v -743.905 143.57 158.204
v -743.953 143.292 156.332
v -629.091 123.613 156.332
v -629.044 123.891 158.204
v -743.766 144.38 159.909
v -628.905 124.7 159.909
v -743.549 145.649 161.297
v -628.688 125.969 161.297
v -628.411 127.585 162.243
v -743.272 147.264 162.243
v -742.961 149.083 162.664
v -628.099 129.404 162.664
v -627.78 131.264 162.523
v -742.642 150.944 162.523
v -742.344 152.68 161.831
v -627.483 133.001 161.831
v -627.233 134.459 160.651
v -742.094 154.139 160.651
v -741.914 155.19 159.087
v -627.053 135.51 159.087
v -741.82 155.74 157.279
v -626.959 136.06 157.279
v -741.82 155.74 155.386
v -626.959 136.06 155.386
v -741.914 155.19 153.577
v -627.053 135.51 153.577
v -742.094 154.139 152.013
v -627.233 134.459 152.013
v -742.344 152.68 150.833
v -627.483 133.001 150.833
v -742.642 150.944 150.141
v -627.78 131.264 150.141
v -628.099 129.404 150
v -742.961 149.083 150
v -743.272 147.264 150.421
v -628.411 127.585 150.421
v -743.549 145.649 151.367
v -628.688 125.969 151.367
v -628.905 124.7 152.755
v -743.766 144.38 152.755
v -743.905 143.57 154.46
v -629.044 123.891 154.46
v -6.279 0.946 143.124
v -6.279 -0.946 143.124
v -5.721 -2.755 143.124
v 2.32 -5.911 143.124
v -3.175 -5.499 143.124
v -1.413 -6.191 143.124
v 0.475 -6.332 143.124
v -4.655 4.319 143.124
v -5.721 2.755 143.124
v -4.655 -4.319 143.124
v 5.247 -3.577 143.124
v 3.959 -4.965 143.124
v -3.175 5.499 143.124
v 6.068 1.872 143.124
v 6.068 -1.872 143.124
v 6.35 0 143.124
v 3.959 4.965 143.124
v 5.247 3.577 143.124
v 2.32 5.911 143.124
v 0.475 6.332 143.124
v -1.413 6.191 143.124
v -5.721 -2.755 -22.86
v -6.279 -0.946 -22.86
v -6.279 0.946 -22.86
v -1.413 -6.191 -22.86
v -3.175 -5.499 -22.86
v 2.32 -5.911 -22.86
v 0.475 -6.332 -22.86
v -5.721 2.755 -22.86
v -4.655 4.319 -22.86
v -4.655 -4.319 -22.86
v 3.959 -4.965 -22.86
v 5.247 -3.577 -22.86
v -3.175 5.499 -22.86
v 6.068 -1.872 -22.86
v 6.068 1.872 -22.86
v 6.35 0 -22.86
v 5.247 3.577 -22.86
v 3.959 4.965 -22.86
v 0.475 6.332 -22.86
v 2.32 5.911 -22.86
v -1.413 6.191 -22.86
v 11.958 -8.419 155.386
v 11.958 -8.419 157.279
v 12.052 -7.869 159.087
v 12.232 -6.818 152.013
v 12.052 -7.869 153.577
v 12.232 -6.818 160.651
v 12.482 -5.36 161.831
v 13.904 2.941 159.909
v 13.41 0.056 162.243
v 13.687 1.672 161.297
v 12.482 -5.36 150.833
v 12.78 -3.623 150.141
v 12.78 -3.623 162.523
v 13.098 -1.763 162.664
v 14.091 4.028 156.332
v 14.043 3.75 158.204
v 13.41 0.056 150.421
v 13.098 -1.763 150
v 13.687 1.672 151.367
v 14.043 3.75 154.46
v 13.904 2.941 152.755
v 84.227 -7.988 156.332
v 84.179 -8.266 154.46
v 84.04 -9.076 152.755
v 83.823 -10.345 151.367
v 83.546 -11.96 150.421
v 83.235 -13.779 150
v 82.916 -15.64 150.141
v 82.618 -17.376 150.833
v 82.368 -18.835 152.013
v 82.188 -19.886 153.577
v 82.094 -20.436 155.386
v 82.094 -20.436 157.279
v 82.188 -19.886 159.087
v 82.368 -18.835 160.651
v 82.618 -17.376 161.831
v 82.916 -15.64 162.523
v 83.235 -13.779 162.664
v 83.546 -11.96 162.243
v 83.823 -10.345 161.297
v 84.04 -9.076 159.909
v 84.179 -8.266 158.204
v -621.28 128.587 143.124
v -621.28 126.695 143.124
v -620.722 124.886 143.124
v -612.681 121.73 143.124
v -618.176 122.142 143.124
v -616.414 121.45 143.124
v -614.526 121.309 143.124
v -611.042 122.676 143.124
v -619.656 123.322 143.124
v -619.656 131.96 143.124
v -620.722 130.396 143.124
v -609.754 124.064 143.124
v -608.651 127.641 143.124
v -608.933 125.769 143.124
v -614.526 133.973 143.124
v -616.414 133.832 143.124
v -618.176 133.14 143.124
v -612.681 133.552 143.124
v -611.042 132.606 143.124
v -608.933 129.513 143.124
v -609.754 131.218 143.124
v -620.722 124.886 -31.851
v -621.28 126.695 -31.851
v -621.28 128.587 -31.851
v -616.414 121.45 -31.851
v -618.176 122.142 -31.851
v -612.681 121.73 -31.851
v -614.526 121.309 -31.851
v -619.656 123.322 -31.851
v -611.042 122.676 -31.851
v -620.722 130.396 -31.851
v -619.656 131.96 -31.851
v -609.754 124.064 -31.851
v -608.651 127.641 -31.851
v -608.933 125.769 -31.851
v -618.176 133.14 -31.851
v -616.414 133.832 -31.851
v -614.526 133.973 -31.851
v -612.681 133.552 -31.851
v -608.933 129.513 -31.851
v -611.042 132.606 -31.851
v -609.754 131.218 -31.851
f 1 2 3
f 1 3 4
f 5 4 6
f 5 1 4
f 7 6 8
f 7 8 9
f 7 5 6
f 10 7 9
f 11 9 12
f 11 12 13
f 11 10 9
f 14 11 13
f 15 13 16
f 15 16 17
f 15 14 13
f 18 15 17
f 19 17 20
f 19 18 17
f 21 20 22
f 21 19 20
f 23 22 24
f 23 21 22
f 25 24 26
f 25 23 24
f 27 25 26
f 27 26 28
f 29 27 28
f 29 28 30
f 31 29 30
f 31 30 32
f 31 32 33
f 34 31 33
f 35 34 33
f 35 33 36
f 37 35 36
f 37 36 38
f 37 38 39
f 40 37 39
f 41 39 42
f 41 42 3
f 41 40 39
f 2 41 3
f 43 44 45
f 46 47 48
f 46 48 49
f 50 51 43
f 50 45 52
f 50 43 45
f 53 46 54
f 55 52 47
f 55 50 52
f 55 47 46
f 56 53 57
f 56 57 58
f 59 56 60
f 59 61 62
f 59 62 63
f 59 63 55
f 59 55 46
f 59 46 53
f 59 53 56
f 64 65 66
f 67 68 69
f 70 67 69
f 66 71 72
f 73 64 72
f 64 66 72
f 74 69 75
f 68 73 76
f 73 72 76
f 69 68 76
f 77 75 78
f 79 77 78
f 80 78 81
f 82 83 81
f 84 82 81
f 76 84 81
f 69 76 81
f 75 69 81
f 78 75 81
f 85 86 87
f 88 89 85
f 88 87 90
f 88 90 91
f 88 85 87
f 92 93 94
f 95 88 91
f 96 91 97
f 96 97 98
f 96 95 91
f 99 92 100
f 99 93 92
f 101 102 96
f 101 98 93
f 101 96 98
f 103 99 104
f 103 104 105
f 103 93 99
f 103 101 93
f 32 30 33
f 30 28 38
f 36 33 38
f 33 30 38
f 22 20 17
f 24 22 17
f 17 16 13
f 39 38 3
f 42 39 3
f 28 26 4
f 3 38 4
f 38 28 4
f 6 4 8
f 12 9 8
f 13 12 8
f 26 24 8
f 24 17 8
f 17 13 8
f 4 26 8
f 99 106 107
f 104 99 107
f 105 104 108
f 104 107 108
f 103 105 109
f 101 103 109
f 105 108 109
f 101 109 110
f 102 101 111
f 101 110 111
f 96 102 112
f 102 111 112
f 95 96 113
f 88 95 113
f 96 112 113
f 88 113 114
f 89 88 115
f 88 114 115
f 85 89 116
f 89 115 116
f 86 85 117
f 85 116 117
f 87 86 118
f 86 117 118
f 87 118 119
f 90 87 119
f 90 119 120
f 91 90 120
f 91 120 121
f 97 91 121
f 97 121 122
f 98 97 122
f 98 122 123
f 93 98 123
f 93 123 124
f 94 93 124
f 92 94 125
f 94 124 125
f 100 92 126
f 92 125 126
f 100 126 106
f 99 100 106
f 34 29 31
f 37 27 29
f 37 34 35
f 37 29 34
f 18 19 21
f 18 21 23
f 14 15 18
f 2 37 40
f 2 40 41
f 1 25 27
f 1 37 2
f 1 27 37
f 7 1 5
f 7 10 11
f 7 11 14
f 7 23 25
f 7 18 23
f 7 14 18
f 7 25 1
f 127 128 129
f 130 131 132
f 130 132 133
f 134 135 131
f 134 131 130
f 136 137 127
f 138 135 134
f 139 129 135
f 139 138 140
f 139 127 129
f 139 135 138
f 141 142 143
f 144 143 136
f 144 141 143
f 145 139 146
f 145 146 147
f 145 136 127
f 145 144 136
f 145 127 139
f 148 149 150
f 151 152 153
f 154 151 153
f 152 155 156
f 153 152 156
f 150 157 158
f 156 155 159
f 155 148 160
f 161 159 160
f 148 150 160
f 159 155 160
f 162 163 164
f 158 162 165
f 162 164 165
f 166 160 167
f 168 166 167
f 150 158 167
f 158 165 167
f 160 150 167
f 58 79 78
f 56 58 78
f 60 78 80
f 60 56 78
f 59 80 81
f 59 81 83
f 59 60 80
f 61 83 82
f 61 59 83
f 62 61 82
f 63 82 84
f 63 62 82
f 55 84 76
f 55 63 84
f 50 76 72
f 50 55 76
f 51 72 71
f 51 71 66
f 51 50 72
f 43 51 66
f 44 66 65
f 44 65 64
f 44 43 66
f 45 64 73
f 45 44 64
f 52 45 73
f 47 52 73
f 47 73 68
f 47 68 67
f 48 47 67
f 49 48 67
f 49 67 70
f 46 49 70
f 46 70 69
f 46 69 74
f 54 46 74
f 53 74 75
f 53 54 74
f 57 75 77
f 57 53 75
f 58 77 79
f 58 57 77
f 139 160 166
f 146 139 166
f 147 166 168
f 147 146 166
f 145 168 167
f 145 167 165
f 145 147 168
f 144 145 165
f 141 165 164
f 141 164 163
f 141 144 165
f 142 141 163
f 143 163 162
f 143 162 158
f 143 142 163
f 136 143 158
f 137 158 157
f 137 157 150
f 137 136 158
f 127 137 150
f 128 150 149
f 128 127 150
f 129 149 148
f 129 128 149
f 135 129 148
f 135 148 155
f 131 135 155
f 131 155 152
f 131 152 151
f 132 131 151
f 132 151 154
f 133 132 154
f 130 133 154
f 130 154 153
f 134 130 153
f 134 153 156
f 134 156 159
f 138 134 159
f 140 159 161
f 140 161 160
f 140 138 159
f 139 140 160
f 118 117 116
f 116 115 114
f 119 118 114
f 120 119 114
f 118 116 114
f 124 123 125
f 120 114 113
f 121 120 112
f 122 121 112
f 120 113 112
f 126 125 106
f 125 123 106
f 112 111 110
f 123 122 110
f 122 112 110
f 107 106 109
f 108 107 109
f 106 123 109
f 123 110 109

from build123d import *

# Parameters (mm, degrees)
BOSS_EXTRUDE1_START     = -71.1581
BOSS_EXTRUDE1_OUTLINE_R = 6.35
BOSS_EXTRUDE1_DEPTH     = 71.1581
SKETCH3_R               = 6.35
BOSS_EXTRUDE2_DEPTH     = 165.984127761
SKETCH5_R               = 6.35
BOSS_EXTRUDE3_DEPTH     = 116.535086485
SKETCH6_R               = 6.35
BOSS_EXTRUDE4_DEPTH     = 174.975611915


# Read off the part's stored shape, not the designer's step: Boss-Extrude1
with BuildPart() as part:
    # Boss-Extrude1 outline → Boss-Extrude1 (new body)
    with BuildSketch(Plane(origin=(13.018306404, -2.230462367, 0), x_dir=(0.16887207501251916, 0.9856379772923556, 0), z_dir=(-0.9856379772923557, 0.16887207501251916, 0)).offset(BOSS_EXTRUDE1_START)):
        with Locations((0, -156.332127761)):
            Circle(BOSS_EXTRUDE1_OUTLINE_R)
    extrude(amount=BOSS_EXTRUDE1_DEPTH)


with BuildPart() as body_2:
    # Sketch3 → Boss-Extrude2 (new body)
    with BuildSketch(Plane.XY.offset(143.124127761)):
        Circle(SKETCH3_R)
    extrude(amount=-BOSS_EXTRUDE2_DEPTH)


with BuildPart() as body_3:
    # Sketch5 → Boss-Extrude3 (new body)
    with BuildSketch(Plane(origin=(-746.587354672, 127.914872059, 0), x_dir=(0.1688720750125156, 0.9856379772923564, -3.034930787787326e-15), z_dir=(-0.9856379772923564, 0.1688720750125156, 1.2809329124968532e-15))):
        with Locations(Location((21.951296195, -156.332127761, 0), (0, 0, 180))):
            Circle(SKETCH5_R)
    extrude(amount=-BOSS_EXTRUDE3_DEPTH)


with BuildPart() as body_4:
    # Sketch6 → Boss-Extrude4 (new body)
    with BuildSketch(Plane.XY.offset(143.124127761)):
        with Locations((-615.000680403, 127.640919006)):
            Circle(SKETCH6_R)
    extrude(amount=-BOSS_EXTRUDE4_DEPTH)


solid = Compound([part.part, body_2.part, body_3.part, body_4.part])
